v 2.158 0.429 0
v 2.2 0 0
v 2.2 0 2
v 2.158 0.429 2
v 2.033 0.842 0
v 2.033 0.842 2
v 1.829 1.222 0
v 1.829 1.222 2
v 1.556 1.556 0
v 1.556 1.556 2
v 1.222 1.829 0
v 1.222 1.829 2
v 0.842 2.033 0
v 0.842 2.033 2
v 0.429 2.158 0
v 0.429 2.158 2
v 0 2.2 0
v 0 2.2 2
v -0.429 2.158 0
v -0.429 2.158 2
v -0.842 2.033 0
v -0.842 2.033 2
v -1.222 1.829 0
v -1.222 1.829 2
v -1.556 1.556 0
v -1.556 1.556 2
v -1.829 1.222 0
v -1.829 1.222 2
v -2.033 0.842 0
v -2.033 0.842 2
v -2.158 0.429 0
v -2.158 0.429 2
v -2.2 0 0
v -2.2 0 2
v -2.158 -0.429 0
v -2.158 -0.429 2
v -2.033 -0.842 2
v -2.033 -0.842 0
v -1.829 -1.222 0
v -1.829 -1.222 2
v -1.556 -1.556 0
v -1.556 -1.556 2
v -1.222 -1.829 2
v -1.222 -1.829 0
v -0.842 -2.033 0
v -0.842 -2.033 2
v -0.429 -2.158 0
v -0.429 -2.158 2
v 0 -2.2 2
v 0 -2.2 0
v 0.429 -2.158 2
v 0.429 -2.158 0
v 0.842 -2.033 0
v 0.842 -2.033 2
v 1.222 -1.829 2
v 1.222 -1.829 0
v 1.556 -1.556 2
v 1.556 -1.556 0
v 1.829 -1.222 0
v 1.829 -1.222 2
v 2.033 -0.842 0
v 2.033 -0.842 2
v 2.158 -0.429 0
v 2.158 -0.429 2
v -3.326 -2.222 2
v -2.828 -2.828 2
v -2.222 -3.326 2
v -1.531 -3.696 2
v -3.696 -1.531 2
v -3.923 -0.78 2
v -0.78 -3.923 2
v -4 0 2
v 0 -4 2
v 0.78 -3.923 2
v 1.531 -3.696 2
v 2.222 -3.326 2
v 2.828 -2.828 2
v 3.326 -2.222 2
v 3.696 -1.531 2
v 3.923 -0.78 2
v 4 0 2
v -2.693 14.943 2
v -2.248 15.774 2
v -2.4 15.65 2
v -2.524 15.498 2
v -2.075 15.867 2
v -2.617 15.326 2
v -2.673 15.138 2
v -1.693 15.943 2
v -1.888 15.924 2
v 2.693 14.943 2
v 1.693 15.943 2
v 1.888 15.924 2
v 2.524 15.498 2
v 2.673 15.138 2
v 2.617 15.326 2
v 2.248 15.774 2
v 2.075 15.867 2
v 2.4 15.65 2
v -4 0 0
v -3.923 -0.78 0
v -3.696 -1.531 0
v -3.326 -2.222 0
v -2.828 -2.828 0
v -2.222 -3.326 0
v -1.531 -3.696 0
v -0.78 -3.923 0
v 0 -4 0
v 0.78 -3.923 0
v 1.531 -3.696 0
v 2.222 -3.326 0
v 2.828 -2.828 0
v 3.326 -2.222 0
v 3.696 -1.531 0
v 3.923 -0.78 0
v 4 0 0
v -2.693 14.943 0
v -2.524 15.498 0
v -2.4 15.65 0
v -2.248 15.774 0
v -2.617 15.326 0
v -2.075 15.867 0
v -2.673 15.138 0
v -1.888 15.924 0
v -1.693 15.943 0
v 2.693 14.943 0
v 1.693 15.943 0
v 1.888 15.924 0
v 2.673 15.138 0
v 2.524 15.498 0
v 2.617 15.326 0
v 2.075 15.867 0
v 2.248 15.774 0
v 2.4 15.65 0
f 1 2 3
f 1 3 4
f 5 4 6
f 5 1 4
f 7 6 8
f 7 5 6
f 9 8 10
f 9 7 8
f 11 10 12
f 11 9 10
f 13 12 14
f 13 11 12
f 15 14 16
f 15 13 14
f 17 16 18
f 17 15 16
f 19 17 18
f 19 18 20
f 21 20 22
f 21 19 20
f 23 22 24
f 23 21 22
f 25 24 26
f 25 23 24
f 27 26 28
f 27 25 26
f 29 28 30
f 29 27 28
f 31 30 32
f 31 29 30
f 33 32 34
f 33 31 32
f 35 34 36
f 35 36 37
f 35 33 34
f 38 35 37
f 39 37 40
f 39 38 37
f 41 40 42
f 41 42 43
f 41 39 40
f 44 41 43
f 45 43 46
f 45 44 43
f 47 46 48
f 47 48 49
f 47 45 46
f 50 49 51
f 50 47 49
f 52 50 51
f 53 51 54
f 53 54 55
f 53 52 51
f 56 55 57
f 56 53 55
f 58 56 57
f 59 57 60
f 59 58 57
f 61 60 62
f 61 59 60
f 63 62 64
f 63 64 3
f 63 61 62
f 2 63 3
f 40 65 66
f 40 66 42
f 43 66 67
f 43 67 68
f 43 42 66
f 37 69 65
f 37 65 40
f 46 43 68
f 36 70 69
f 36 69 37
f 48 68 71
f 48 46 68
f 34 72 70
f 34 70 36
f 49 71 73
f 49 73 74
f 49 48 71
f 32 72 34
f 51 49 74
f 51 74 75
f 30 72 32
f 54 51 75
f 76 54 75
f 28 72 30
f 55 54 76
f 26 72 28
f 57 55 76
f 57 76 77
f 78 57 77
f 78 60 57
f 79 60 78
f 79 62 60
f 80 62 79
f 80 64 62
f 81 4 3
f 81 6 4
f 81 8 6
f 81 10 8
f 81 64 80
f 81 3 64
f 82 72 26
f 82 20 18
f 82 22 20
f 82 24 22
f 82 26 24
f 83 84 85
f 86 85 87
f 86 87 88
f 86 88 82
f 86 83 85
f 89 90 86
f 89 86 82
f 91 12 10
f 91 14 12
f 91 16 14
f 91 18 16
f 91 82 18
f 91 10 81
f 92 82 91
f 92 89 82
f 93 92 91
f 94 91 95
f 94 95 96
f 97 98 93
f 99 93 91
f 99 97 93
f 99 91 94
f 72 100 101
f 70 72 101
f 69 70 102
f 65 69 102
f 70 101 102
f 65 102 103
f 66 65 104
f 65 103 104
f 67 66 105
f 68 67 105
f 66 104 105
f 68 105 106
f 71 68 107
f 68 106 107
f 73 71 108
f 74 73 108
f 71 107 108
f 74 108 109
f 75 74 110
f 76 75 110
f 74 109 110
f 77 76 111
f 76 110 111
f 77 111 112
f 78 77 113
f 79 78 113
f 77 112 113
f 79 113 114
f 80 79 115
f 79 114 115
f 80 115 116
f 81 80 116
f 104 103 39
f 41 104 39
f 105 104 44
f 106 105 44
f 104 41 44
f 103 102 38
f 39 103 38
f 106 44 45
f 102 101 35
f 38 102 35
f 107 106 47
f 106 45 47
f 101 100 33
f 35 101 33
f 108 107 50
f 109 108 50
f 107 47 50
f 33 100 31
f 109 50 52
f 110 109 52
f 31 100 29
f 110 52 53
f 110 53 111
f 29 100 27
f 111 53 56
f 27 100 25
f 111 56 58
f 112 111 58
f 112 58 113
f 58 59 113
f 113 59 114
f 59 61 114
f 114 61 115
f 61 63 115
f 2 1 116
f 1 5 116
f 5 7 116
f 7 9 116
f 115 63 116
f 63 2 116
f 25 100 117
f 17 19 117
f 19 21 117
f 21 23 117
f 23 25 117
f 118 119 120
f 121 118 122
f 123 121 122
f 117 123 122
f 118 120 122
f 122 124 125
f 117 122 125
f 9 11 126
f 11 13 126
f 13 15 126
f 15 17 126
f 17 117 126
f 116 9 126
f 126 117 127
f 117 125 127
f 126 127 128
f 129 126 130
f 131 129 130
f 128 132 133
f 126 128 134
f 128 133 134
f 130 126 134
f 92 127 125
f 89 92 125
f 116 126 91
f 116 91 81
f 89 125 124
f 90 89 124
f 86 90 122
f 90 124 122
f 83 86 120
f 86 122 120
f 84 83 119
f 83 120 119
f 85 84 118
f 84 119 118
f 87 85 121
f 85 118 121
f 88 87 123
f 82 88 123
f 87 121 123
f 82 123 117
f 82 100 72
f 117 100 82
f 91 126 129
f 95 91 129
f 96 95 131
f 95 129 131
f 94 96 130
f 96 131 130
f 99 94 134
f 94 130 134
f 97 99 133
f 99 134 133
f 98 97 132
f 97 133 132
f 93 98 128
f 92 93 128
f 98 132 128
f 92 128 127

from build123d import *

# Parameters (mm, degrees)
SKETCH_R  = 2.2
PAD_DEPTH = 2


with BuildPart() as part:
    # Sketch → Pad (new body)
    with BuildSketch(Plane.XY):
        with BuildLine():
            ThreePointArc((-4, 0), (0, -4), (4, 0))
            Line((2.692664, 14.94292), (4, 0))
            ThreePointArc((2.692664, 14.94292), (2.399771, 15.650027), (1.692664, 15.94292))
            Line((1.692664, 15.94292), (0, 15.94292))
            Line((-1.692664, 15.94292), (0, 15.94292))
            ThreePointArc((-1.692664, 15.94292), (-2.399771, 15.650027), (-2.692664, 14.94292))
            Line((-4, 0), (-2.692664, 14.94292))
        make_face()
        Circle(SKETCH_R, mode=Mode.SUBTRACT)
    extrude(amount=PAD_DEPTH)


solid = part.part
